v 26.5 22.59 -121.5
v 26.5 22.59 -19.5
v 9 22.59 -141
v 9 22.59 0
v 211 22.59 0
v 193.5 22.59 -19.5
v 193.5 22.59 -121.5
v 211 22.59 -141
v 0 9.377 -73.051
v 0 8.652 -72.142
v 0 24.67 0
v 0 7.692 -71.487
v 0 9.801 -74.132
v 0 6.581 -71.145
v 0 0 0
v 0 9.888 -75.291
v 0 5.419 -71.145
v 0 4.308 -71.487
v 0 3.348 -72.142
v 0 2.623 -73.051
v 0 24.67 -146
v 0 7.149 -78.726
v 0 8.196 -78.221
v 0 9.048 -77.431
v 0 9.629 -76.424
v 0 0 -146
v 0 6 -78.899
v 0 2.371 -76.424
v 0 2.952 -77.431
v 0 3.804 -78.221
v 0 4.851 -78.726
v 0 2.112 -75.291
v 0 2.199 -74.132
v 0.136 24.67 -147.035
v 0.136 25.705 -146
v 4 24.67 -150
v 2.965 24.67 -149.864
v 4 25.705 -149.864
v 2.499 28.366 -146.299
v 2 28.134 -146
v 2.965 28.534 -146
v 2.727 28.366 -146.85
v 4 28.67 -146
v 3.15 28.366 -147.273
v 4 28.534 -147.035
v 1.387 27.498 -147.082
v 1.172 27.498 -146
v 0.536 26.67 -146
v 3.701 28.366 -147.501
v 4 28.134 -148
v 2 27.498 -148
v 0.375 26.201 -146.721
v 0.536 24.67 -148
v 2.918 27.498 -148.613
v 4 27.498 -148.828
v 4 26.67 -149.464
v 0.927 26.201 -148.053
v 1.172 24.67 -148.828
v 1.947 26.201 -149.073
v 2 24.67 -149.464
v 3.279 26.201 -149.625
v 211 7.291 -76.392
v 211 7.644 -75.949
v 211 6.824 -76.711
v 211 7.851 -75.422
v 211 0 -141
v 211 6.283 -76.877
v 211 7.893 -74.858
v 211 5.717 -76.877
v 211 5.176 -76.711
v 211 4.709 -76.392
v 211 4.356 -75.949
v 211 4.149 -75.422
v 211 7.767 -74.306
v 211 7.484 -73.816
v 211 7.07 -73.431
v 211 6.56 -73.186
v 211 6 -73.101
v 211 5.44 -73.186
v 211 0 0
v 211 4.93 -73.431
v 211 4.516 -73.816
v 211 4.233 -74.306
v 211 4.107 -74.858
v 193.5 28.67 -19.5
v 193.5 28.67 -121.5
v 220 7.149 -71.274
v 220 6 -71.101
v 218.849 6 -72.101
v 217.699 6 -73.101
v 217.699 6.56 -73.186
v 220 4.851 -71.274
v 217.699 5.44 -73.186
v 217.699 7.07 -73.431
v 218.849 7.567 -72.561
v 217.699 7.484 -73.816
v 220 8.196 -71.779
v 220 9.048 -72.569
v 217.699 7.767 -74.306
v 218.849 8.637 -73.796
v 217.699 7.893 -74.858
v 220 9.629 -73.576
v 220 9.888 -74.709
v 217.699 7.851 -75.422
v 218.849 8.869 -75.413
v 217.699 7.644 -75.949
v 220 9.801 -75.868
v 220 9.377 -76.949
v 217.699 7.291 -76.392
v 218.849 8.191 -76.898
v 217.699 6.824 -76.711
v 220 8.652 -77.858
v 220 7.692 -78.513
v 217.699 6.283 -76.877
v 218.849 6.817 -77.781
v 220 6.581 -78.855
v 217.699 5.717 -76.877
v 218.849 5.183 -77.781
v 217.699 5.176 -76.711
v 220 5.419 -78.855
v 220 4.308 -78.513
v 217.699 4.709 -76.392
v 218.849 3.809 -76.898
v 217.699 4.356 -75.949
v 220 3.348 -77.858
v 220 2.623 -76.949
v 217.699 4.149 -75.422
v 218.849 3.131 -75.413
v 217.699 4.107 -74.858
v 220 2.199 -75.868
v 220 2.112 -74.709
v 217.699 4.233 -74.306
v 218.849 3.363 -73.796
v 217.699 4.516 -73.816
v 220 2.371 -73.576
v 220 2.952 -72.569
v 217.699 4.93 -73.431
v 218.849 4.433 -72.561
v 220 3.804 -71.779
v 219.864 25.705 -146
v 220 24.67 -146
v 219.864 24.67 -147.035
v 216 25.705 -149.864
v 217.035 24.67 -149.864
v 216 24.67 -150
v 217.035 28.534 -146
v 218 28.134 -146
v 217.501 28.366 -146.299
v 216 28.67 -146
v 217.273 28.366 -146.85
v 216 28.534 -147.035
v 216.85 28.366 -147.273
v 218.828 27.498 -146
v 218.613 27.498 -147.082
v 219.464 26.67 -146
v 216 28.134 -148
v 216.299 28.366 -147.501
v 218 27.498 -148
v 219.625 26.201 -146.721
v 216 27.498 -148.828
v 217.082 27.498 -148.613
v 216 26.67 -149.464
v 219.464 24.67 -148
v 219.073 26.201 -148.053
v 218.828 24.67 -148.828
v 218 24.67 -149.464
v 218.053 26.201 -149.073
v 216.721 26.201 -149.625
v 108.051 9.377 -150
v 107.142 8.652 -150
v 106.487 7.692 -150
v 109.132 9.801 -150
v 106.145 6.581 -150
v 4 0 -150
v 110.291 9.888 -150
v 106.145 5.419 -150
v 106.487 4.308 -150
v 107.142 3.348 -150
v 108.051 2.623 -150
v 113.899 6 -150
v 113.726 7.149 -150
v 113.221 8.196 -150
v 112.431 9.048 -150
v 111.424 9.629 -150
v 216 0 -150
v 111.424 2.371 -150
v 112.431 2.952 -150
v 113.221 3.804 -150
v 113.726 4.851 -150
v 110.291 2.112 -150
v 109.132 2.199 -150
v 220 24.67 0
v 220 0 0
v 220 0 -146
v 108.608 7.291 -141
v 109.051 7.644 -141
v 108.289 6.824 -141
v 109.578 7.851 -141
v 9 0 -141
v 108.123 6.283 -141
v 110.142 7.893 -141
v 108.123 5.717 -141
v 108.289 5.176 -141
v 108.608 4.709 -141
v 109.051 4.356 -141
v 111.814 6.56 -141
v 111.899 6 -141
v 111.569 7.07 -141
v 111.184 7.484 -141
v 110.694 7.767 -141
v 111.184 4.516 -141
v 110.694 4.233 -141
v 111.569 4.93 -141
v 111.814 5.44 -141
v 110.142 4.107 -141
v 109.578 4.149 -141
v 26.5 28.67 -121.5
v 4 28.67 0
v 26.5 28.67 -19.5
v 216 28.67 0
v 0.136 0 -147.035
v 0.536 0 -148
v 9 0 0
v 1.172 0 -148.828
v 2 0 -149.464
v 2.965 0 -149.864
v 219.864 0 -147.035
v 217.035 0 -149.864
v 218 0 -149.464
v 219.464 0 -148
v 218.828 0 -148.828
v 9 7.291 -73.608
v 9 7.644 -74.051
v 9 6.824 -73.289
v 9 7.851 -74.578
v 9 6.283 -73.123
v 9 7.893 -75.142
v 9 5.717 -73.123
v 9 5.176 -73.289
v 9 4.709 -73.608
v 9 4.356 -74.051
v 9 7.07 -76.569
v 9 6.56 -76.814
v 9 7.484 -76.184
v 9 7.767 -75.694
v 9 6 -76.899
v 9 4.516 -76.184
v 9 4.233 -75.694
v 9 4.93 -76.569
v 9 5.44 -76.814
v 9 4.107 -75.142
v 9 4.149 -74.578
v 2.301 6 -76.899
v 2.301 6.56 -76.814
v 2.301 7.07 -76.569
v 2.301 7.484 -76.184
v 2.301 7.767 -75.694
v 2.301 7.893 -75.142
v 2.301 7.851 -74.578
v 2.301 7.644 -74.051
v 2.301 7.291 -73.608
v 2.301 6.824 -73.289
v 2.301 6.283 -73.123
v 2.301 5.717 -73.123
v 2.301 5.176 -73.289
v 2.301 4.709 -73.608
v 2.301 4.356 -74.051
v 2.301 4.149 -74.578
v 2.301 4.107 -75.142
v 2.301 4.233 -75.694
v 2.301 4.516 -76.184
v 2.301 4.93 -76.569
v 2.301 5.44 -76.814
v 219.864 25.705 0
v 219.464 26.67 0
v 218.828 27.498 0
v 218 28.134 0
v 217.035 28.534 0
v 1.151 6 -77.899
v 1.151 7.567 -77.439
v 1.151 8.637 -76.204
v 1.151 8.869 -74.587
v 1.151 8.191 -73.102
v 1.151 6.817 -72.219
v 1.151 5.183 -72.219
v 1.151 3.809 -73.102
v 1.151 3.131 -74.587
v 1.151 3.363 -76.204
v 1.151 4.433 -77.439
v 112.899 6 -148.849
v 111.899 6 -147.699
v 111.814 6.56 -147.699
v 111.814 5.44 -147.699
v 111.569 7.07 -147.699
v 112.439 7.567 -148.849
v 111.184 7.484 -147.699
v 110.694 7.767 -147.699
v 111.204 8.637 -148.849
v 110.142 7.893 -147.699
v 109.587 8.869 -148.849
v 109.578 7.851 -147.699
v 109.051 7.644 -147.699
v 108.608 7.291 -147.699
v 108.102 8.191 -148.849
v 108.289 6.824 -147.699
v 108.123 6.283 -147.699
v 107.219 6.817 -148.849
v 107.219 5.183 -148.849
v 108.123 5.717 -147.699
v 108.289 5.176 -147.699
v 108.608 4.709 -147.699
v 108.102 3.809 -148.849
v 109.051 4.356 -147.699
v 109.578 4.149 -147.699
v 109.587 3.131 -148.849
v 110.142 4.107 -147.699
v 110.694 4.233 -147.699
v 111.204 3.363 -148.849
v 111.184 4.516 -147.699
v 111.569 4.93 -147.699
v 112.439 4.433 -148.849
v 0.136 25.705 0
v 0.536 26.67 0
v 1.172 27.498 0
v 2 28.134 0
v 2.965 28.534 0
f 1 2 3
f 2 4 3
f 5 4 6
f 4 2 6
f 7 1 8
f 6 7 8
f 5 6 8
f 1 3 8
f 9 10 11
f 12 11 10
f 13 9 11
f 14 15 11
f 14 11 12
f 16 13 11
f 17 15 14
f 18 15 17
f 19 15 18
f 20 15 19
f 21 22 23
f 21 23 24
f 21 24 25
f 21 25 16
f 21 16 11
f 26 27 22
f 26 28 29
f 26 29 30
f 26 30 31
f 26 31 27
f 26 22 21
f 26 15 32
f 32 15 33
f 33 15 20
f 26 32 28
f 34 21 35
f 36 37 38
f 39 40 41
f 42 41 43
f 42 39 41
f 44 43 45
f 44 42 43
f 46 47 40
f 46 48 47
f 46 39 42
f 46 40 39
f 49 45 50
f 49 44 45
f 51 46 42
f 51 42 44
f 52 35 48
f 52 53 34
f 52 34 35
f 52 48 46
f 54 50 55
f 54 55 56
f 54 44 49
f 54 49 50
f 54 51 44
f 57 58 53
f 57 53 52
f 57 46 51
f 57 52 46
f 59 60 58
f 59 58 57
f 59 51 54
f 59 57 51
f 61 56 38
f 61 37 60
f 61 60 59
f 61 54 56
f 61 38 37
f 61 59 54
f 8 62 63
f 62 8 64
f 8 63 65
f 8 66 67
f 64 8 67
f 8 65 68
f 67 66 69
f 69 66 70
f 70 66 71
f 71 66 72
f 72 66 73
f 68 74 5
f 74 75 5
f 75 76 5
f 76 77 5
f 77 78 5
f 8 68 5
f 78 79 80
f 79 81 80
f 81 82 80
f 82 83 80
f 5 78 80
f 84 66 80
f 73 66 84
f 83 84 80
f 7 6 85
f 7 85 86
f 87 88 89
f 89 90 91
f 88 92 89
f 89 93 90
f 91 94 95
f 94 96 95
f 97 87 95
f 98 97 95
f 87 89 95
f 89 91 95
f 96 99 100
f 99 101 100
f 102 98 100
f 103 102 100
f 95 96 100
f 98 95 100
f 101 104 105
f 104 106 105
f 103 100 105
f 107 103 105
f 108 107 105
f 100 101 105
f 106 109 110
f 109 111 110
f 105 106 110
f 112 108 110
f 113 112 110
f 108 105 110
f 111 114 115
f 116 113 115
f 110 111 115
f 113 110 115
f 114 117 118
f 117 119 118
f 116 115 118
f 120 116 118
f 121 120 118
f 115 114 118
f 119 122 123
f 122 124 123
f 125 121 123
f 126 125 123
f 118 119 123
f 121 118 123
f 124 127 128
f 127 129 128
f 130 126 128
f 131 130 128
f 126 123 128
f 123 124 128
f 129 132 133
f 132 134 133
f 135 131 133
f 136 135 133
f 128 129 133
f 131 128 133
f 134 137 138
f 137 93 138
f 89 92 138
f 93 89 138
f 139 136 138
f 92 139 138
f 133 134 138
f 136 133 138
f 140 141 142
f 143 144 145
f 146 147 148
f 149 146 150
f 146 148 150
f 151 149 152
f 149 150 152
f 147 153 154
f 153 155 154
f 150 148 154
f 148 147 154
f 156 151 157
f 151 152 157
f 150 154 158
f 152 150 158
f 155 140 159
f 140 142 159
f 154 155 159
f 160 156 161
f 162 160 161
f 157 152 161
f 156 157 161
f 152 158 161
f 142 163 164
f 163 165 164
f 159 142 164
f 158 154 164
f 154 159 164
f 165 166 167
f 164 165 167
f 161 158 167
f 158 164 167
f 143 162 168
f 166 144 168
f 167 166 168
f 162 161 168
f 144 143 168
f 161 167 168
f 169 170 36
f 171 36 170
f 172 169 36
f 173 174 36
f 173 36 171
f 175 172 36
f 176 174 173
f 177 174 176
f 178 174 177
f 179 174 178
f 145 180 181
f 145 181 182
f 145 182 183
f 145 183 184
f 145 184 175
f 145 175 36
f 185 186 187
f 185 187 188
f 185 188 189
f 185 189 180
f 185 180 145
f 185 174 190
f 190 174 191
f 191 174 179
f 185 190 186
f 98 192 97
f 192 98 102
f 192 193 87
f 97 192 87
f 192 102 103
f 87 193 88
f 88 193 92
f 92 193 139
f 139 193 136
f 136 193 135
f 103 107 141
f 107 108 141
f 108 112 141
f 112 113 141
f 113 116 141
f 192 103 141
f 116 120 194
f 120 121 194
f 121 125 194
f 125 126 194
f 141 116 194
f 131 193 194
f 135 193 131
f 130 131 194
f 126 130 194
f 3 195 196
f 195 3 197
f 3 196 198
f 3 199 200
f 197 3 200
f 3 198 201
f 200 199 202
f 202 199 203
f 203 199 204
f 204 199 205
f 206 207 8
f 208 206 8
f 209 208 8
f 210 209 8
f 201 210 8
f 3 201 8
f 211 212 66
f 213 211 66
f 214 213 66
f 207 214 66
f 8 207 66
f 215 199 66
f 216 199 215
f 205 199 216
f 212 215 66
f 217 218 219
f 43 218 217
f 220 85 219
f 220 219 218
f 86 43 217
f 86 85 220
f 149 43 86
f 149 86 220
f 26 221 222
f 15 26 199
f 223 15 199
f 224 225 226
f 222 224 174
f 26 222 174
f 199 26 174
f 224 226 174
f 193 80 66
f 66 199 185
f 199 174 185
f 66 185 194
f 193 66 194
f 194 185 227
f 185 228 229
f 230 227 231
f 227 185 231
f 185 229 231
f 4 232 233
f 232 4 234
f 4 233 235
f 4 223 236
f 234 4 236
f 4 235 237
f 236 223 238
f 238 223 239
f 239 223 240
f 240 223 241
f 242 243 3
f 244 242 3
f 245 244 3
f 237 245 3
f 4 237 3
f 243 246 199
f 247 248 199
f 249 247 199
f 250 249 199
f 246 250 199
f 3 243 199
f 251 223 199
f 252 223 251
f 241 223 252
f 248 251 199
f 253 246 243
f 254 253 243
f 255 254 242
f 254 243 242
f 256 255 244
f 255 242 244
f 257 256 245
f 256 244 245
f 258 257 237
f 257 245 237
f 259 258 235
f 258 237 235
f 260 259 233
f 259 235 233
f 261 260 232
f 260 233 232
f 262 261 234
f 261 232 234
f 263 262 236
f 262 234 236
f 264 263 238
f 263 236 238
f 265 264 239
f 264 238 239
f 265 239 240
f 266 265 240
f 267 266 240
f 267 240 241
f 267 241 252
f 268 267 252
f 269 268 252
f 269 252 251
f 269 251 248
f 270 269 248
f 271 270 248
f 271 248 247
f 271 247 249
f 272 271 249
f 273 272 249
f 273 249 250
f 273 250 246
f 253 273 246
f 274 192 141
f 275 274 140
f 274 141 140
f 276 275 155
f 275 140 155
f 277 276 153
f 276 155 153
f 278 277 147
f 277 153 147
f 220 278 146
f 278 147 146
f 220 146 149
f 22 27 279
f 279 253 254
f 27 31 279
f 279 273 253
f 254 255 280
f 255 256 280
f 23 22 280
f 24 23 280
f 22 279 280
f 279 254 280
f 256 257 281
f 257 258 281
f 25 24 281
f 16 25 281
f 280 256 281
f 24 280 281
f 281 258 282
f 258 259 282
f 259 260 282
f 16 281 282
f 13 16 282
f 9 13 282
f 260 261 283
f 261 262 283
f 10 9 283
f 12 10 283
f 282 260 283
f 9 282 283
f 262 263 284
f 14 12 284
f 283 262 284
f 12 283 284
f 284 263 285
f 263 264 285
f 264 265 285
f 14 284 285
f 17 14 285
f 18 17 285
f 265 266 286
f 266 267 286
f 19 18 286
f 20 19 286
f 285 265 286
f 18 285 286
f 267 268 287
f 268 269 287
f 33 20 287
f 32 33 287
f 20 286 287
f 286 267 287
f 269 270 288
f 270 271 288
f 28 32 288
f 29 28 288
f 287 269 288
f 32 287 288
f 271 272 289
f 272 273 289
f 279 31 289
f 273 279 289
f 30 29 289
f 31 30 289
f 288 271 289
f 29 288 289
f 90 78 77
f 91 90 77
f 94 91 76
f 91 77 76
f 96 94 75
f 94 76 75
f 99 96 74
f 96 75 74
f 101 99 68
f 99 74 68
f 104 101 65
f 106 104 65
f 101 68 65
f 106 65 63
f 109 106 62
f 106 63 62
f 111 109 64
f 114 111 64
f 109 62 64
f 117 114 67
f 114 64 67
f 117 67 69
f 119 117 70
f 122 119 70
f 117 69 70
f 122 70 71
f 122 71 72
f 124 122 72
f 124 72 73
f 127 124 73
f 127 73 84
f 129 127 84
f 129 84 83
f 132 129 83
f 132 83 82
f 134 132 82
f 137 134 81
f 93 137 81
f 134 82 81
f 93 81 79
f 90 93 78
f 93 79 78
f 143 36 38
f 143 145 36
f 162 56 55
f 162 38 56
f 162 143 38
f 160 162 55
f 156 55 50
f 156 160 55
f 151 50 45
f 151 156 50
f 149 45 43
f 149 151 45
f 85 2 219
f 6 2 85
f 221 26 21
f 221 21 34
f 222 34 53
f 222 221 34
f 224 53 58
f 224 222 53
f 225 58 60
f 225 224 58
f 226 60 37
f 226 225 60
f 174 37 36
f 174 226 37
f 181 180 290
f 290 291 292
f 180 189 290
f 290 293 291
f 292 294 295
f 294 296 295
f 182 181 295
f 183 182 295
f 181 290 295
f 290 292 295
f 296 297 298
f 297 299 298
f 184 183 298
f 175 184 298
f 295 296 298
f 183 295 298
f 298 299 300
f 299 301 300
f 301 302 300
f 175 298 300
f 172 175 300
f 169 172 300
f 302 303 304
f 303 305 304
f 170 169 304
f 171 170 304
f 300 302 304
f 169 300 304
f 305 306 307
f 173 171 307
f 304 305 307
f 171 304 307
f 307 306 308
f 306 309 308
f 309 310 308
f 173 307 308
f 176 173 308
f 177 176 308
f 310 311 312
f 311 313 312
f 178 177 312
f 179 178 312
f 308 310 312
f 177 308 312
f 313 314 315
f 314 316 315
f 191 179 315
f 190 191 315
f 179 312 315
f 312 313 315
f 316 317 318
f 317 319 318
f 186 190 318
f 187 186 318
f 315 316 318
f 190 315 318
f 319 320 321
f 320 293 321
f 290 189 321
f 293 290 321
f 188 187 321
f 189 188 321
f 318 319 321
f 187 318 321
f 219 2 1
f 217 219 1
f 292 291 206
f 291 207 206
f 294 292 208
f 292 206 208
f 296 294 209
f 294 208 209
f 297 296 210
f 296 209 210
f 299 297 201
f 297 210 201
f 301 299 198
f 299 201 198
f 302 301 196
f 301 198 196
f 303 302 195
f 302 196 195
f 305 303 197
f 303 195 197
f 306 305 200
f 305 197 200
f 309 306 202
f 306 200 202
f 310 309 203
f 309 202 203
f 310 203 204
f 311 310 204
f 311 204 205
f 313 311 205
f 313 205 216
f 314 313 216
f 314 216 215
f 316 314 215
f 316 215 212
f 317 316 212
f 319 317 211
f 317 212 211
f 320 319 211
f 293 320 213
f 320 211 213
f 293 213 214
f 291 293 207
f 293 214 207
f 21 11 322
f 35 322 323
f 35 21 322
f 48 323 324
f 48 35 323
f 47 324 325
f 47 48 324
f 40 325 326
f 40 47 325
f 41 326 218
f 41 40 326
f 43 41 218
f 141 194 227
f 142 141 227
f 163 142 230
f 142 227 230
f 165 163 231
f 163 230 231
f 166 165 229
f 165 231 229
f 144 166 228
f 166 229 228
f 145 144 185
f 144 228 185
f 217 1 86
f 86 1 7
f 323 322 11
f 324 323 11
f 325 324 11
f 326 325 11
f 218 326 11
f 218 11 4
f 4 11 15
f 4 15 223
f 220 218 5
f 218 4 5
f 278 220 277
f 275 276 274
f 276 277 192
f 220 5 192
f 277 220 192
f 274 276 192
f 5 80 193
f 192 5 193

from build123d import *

# Parameters (mm, degrees)
BOSS_EXTRUDE1_DEPTH                               = 22.59
SKETCH2_W                                         = 220
SKETCH2_H                                         = 150
SKETCH2_W_2                                       = 167
SKETCH2_H_2                                       = 102
BOSS_EXTRUDE2_DEPTH                               = 6.08
CSK_FOR_6_FLAT_HEAD_SOCKET_CAP_SCREW2_D           = 3.7973
CSK_FOR_6_FLAT_HEAD_SOCKET_CAP_SCREW2_DEPTH       = 9
CSK_FOR_6_FLAT_HEAD_SOCKET_CAP_SCREW2_CSINK_D     = 7.7978
CSK_FOR_6_FLAT_HEAD_SOCKET_CAP_SCREW2_CSINK_ANGLE = 82
CSK_FOR_6_FLAT_HEAD_SOCKET_CAP_SCREW3_D           = 3.7973
CSK_FOR_6_FLAT_HEAD_SOCKET_CAP_SCREW3_CSINK_D     = 7.7978
CSK_FOR_6_FLAT_HEAD_SOCKET_CAP_SCREW3_CSINK_ANGLE = 82
CSK_FOR_6_FLAT_HEAD_SOCKET_CAP_SCREW4_D           = 3.7973
CSK_FOR_6_FLAT_HEAD_SOCKET_CAP_SCREW4_CSINK_D     = 7.7978
CSK_FOR_6_FLAT_HEAD_SOCKET_CAP_SCREW4_CSINK_ANGLE = 82
FILLET1_R                                         = 4


with BuildPart() as part:
    # Sketch1 → Boss-Extrude1 (new body)
    with BuildSketch(Plane(origin=(0, 0, 0), x_dir=(1, 0, 0), z_dir=(0, 1, 0))):
        Polygon((211, 0), (220, 0), (220, 150), (0, 150), (0, 0), (9, 0), (9, 141), (211, 141), align=None)
    extrude(amount=BOSS_EXTRUDE1_DEPTH)

    # Sketch2 → Boss-Extrude2 (add)
    with BuildSketch(Plane(origin=(0, 22.59, 0), x_dir=(1, 0, 0), z_dir=(0, 1, 0))):
        with Locations((110, 75)):
            Rectangle(SKETCH2_W, SKETCH2_H)
        with Locations((110, 70.5)):
            Rectangle(SKETCH2_W_2, SKETCH2_H_2, mode=Mode.SUBTRACT)
    extrude(amount=BOSS_EXTRUDE2_DEPTH)

    # CSK for #6 Flat Head Socket Cap Screw2
    with Locations(Plane(origin=(220, 0, 0), x_dir=(0, 0, -1), z_dir=(1, 0, 0))):
        with Locations((75, 6)):
            CounterSinkHole(CSK_FOR_6_FLAT_HEAD_SOCKET_CAP_SCREW2_D / 2, CSK_FOR_6_FLAT_HEAD_SOCKET_CAP_SCREW2_CSINK_D / 2, depth=CSK_FOR_6_FLAT_HEAD_SOCKET_CAP_SCREW2_DEPTH, counter_sink_angle=CSK_FOR_6_FLAT_HEAD_SOCKET_CAP_SCREW2_CSINK_ANGLE)

    # CSK for #6 Flat Head Socket Cap Screw3 (through all)
    with Locations(Plane(origin=(0, 0, -150), x_dir=(-1, 0, 0), z_dir=(0, 0, -1))):
        with Locations((-110, 6)):
            CounterSinkHole(CSK_FOR_6_FLAT_HEAD_SOCKET_CAP_SCREW3_D / 2, CSK_FOR_6_FLAT_HEAD_SOCKET_CAP_SCREW3_CSINK_D / 2, counter_sink_angle=CSK_FOR_6_FLAT_HEAD_SOCKET_CAP_SCREW3_CSINK_ANGLE)

    # CSK for #6 Flat Head Socket Cap Screw4 (through all)
    with Locations(Plane.ZY):
        with Locations((-75, 6)):
            CounterSinkHole(CSK_FOR_6_FLAT_HEAD_SOCKET_CAP_SCREW4_D / 2, CSK_FOR_6_FLAT_HEAD_SOCKET_CAP_SCREW4_CSINK_D / 2, counter_sink_angle=CSK_FOR_6_FLAT_HEAD_SOCKET_CAP_SCREW4_CSINK_ANGLE)

    # Fillet1
    fillet1_edges = [part.edges().sort_by_distance(p)[0] for p in [
        (0, 14.335, -150),
        (220, 14.335, -150),
        (0, 28.67, -75),
        (220, 28.67, -75),
        (110, 28.67, -150),
    ]]
    fillet(fillet1_edges, radius=FILLET1_R)


solid = part.part
